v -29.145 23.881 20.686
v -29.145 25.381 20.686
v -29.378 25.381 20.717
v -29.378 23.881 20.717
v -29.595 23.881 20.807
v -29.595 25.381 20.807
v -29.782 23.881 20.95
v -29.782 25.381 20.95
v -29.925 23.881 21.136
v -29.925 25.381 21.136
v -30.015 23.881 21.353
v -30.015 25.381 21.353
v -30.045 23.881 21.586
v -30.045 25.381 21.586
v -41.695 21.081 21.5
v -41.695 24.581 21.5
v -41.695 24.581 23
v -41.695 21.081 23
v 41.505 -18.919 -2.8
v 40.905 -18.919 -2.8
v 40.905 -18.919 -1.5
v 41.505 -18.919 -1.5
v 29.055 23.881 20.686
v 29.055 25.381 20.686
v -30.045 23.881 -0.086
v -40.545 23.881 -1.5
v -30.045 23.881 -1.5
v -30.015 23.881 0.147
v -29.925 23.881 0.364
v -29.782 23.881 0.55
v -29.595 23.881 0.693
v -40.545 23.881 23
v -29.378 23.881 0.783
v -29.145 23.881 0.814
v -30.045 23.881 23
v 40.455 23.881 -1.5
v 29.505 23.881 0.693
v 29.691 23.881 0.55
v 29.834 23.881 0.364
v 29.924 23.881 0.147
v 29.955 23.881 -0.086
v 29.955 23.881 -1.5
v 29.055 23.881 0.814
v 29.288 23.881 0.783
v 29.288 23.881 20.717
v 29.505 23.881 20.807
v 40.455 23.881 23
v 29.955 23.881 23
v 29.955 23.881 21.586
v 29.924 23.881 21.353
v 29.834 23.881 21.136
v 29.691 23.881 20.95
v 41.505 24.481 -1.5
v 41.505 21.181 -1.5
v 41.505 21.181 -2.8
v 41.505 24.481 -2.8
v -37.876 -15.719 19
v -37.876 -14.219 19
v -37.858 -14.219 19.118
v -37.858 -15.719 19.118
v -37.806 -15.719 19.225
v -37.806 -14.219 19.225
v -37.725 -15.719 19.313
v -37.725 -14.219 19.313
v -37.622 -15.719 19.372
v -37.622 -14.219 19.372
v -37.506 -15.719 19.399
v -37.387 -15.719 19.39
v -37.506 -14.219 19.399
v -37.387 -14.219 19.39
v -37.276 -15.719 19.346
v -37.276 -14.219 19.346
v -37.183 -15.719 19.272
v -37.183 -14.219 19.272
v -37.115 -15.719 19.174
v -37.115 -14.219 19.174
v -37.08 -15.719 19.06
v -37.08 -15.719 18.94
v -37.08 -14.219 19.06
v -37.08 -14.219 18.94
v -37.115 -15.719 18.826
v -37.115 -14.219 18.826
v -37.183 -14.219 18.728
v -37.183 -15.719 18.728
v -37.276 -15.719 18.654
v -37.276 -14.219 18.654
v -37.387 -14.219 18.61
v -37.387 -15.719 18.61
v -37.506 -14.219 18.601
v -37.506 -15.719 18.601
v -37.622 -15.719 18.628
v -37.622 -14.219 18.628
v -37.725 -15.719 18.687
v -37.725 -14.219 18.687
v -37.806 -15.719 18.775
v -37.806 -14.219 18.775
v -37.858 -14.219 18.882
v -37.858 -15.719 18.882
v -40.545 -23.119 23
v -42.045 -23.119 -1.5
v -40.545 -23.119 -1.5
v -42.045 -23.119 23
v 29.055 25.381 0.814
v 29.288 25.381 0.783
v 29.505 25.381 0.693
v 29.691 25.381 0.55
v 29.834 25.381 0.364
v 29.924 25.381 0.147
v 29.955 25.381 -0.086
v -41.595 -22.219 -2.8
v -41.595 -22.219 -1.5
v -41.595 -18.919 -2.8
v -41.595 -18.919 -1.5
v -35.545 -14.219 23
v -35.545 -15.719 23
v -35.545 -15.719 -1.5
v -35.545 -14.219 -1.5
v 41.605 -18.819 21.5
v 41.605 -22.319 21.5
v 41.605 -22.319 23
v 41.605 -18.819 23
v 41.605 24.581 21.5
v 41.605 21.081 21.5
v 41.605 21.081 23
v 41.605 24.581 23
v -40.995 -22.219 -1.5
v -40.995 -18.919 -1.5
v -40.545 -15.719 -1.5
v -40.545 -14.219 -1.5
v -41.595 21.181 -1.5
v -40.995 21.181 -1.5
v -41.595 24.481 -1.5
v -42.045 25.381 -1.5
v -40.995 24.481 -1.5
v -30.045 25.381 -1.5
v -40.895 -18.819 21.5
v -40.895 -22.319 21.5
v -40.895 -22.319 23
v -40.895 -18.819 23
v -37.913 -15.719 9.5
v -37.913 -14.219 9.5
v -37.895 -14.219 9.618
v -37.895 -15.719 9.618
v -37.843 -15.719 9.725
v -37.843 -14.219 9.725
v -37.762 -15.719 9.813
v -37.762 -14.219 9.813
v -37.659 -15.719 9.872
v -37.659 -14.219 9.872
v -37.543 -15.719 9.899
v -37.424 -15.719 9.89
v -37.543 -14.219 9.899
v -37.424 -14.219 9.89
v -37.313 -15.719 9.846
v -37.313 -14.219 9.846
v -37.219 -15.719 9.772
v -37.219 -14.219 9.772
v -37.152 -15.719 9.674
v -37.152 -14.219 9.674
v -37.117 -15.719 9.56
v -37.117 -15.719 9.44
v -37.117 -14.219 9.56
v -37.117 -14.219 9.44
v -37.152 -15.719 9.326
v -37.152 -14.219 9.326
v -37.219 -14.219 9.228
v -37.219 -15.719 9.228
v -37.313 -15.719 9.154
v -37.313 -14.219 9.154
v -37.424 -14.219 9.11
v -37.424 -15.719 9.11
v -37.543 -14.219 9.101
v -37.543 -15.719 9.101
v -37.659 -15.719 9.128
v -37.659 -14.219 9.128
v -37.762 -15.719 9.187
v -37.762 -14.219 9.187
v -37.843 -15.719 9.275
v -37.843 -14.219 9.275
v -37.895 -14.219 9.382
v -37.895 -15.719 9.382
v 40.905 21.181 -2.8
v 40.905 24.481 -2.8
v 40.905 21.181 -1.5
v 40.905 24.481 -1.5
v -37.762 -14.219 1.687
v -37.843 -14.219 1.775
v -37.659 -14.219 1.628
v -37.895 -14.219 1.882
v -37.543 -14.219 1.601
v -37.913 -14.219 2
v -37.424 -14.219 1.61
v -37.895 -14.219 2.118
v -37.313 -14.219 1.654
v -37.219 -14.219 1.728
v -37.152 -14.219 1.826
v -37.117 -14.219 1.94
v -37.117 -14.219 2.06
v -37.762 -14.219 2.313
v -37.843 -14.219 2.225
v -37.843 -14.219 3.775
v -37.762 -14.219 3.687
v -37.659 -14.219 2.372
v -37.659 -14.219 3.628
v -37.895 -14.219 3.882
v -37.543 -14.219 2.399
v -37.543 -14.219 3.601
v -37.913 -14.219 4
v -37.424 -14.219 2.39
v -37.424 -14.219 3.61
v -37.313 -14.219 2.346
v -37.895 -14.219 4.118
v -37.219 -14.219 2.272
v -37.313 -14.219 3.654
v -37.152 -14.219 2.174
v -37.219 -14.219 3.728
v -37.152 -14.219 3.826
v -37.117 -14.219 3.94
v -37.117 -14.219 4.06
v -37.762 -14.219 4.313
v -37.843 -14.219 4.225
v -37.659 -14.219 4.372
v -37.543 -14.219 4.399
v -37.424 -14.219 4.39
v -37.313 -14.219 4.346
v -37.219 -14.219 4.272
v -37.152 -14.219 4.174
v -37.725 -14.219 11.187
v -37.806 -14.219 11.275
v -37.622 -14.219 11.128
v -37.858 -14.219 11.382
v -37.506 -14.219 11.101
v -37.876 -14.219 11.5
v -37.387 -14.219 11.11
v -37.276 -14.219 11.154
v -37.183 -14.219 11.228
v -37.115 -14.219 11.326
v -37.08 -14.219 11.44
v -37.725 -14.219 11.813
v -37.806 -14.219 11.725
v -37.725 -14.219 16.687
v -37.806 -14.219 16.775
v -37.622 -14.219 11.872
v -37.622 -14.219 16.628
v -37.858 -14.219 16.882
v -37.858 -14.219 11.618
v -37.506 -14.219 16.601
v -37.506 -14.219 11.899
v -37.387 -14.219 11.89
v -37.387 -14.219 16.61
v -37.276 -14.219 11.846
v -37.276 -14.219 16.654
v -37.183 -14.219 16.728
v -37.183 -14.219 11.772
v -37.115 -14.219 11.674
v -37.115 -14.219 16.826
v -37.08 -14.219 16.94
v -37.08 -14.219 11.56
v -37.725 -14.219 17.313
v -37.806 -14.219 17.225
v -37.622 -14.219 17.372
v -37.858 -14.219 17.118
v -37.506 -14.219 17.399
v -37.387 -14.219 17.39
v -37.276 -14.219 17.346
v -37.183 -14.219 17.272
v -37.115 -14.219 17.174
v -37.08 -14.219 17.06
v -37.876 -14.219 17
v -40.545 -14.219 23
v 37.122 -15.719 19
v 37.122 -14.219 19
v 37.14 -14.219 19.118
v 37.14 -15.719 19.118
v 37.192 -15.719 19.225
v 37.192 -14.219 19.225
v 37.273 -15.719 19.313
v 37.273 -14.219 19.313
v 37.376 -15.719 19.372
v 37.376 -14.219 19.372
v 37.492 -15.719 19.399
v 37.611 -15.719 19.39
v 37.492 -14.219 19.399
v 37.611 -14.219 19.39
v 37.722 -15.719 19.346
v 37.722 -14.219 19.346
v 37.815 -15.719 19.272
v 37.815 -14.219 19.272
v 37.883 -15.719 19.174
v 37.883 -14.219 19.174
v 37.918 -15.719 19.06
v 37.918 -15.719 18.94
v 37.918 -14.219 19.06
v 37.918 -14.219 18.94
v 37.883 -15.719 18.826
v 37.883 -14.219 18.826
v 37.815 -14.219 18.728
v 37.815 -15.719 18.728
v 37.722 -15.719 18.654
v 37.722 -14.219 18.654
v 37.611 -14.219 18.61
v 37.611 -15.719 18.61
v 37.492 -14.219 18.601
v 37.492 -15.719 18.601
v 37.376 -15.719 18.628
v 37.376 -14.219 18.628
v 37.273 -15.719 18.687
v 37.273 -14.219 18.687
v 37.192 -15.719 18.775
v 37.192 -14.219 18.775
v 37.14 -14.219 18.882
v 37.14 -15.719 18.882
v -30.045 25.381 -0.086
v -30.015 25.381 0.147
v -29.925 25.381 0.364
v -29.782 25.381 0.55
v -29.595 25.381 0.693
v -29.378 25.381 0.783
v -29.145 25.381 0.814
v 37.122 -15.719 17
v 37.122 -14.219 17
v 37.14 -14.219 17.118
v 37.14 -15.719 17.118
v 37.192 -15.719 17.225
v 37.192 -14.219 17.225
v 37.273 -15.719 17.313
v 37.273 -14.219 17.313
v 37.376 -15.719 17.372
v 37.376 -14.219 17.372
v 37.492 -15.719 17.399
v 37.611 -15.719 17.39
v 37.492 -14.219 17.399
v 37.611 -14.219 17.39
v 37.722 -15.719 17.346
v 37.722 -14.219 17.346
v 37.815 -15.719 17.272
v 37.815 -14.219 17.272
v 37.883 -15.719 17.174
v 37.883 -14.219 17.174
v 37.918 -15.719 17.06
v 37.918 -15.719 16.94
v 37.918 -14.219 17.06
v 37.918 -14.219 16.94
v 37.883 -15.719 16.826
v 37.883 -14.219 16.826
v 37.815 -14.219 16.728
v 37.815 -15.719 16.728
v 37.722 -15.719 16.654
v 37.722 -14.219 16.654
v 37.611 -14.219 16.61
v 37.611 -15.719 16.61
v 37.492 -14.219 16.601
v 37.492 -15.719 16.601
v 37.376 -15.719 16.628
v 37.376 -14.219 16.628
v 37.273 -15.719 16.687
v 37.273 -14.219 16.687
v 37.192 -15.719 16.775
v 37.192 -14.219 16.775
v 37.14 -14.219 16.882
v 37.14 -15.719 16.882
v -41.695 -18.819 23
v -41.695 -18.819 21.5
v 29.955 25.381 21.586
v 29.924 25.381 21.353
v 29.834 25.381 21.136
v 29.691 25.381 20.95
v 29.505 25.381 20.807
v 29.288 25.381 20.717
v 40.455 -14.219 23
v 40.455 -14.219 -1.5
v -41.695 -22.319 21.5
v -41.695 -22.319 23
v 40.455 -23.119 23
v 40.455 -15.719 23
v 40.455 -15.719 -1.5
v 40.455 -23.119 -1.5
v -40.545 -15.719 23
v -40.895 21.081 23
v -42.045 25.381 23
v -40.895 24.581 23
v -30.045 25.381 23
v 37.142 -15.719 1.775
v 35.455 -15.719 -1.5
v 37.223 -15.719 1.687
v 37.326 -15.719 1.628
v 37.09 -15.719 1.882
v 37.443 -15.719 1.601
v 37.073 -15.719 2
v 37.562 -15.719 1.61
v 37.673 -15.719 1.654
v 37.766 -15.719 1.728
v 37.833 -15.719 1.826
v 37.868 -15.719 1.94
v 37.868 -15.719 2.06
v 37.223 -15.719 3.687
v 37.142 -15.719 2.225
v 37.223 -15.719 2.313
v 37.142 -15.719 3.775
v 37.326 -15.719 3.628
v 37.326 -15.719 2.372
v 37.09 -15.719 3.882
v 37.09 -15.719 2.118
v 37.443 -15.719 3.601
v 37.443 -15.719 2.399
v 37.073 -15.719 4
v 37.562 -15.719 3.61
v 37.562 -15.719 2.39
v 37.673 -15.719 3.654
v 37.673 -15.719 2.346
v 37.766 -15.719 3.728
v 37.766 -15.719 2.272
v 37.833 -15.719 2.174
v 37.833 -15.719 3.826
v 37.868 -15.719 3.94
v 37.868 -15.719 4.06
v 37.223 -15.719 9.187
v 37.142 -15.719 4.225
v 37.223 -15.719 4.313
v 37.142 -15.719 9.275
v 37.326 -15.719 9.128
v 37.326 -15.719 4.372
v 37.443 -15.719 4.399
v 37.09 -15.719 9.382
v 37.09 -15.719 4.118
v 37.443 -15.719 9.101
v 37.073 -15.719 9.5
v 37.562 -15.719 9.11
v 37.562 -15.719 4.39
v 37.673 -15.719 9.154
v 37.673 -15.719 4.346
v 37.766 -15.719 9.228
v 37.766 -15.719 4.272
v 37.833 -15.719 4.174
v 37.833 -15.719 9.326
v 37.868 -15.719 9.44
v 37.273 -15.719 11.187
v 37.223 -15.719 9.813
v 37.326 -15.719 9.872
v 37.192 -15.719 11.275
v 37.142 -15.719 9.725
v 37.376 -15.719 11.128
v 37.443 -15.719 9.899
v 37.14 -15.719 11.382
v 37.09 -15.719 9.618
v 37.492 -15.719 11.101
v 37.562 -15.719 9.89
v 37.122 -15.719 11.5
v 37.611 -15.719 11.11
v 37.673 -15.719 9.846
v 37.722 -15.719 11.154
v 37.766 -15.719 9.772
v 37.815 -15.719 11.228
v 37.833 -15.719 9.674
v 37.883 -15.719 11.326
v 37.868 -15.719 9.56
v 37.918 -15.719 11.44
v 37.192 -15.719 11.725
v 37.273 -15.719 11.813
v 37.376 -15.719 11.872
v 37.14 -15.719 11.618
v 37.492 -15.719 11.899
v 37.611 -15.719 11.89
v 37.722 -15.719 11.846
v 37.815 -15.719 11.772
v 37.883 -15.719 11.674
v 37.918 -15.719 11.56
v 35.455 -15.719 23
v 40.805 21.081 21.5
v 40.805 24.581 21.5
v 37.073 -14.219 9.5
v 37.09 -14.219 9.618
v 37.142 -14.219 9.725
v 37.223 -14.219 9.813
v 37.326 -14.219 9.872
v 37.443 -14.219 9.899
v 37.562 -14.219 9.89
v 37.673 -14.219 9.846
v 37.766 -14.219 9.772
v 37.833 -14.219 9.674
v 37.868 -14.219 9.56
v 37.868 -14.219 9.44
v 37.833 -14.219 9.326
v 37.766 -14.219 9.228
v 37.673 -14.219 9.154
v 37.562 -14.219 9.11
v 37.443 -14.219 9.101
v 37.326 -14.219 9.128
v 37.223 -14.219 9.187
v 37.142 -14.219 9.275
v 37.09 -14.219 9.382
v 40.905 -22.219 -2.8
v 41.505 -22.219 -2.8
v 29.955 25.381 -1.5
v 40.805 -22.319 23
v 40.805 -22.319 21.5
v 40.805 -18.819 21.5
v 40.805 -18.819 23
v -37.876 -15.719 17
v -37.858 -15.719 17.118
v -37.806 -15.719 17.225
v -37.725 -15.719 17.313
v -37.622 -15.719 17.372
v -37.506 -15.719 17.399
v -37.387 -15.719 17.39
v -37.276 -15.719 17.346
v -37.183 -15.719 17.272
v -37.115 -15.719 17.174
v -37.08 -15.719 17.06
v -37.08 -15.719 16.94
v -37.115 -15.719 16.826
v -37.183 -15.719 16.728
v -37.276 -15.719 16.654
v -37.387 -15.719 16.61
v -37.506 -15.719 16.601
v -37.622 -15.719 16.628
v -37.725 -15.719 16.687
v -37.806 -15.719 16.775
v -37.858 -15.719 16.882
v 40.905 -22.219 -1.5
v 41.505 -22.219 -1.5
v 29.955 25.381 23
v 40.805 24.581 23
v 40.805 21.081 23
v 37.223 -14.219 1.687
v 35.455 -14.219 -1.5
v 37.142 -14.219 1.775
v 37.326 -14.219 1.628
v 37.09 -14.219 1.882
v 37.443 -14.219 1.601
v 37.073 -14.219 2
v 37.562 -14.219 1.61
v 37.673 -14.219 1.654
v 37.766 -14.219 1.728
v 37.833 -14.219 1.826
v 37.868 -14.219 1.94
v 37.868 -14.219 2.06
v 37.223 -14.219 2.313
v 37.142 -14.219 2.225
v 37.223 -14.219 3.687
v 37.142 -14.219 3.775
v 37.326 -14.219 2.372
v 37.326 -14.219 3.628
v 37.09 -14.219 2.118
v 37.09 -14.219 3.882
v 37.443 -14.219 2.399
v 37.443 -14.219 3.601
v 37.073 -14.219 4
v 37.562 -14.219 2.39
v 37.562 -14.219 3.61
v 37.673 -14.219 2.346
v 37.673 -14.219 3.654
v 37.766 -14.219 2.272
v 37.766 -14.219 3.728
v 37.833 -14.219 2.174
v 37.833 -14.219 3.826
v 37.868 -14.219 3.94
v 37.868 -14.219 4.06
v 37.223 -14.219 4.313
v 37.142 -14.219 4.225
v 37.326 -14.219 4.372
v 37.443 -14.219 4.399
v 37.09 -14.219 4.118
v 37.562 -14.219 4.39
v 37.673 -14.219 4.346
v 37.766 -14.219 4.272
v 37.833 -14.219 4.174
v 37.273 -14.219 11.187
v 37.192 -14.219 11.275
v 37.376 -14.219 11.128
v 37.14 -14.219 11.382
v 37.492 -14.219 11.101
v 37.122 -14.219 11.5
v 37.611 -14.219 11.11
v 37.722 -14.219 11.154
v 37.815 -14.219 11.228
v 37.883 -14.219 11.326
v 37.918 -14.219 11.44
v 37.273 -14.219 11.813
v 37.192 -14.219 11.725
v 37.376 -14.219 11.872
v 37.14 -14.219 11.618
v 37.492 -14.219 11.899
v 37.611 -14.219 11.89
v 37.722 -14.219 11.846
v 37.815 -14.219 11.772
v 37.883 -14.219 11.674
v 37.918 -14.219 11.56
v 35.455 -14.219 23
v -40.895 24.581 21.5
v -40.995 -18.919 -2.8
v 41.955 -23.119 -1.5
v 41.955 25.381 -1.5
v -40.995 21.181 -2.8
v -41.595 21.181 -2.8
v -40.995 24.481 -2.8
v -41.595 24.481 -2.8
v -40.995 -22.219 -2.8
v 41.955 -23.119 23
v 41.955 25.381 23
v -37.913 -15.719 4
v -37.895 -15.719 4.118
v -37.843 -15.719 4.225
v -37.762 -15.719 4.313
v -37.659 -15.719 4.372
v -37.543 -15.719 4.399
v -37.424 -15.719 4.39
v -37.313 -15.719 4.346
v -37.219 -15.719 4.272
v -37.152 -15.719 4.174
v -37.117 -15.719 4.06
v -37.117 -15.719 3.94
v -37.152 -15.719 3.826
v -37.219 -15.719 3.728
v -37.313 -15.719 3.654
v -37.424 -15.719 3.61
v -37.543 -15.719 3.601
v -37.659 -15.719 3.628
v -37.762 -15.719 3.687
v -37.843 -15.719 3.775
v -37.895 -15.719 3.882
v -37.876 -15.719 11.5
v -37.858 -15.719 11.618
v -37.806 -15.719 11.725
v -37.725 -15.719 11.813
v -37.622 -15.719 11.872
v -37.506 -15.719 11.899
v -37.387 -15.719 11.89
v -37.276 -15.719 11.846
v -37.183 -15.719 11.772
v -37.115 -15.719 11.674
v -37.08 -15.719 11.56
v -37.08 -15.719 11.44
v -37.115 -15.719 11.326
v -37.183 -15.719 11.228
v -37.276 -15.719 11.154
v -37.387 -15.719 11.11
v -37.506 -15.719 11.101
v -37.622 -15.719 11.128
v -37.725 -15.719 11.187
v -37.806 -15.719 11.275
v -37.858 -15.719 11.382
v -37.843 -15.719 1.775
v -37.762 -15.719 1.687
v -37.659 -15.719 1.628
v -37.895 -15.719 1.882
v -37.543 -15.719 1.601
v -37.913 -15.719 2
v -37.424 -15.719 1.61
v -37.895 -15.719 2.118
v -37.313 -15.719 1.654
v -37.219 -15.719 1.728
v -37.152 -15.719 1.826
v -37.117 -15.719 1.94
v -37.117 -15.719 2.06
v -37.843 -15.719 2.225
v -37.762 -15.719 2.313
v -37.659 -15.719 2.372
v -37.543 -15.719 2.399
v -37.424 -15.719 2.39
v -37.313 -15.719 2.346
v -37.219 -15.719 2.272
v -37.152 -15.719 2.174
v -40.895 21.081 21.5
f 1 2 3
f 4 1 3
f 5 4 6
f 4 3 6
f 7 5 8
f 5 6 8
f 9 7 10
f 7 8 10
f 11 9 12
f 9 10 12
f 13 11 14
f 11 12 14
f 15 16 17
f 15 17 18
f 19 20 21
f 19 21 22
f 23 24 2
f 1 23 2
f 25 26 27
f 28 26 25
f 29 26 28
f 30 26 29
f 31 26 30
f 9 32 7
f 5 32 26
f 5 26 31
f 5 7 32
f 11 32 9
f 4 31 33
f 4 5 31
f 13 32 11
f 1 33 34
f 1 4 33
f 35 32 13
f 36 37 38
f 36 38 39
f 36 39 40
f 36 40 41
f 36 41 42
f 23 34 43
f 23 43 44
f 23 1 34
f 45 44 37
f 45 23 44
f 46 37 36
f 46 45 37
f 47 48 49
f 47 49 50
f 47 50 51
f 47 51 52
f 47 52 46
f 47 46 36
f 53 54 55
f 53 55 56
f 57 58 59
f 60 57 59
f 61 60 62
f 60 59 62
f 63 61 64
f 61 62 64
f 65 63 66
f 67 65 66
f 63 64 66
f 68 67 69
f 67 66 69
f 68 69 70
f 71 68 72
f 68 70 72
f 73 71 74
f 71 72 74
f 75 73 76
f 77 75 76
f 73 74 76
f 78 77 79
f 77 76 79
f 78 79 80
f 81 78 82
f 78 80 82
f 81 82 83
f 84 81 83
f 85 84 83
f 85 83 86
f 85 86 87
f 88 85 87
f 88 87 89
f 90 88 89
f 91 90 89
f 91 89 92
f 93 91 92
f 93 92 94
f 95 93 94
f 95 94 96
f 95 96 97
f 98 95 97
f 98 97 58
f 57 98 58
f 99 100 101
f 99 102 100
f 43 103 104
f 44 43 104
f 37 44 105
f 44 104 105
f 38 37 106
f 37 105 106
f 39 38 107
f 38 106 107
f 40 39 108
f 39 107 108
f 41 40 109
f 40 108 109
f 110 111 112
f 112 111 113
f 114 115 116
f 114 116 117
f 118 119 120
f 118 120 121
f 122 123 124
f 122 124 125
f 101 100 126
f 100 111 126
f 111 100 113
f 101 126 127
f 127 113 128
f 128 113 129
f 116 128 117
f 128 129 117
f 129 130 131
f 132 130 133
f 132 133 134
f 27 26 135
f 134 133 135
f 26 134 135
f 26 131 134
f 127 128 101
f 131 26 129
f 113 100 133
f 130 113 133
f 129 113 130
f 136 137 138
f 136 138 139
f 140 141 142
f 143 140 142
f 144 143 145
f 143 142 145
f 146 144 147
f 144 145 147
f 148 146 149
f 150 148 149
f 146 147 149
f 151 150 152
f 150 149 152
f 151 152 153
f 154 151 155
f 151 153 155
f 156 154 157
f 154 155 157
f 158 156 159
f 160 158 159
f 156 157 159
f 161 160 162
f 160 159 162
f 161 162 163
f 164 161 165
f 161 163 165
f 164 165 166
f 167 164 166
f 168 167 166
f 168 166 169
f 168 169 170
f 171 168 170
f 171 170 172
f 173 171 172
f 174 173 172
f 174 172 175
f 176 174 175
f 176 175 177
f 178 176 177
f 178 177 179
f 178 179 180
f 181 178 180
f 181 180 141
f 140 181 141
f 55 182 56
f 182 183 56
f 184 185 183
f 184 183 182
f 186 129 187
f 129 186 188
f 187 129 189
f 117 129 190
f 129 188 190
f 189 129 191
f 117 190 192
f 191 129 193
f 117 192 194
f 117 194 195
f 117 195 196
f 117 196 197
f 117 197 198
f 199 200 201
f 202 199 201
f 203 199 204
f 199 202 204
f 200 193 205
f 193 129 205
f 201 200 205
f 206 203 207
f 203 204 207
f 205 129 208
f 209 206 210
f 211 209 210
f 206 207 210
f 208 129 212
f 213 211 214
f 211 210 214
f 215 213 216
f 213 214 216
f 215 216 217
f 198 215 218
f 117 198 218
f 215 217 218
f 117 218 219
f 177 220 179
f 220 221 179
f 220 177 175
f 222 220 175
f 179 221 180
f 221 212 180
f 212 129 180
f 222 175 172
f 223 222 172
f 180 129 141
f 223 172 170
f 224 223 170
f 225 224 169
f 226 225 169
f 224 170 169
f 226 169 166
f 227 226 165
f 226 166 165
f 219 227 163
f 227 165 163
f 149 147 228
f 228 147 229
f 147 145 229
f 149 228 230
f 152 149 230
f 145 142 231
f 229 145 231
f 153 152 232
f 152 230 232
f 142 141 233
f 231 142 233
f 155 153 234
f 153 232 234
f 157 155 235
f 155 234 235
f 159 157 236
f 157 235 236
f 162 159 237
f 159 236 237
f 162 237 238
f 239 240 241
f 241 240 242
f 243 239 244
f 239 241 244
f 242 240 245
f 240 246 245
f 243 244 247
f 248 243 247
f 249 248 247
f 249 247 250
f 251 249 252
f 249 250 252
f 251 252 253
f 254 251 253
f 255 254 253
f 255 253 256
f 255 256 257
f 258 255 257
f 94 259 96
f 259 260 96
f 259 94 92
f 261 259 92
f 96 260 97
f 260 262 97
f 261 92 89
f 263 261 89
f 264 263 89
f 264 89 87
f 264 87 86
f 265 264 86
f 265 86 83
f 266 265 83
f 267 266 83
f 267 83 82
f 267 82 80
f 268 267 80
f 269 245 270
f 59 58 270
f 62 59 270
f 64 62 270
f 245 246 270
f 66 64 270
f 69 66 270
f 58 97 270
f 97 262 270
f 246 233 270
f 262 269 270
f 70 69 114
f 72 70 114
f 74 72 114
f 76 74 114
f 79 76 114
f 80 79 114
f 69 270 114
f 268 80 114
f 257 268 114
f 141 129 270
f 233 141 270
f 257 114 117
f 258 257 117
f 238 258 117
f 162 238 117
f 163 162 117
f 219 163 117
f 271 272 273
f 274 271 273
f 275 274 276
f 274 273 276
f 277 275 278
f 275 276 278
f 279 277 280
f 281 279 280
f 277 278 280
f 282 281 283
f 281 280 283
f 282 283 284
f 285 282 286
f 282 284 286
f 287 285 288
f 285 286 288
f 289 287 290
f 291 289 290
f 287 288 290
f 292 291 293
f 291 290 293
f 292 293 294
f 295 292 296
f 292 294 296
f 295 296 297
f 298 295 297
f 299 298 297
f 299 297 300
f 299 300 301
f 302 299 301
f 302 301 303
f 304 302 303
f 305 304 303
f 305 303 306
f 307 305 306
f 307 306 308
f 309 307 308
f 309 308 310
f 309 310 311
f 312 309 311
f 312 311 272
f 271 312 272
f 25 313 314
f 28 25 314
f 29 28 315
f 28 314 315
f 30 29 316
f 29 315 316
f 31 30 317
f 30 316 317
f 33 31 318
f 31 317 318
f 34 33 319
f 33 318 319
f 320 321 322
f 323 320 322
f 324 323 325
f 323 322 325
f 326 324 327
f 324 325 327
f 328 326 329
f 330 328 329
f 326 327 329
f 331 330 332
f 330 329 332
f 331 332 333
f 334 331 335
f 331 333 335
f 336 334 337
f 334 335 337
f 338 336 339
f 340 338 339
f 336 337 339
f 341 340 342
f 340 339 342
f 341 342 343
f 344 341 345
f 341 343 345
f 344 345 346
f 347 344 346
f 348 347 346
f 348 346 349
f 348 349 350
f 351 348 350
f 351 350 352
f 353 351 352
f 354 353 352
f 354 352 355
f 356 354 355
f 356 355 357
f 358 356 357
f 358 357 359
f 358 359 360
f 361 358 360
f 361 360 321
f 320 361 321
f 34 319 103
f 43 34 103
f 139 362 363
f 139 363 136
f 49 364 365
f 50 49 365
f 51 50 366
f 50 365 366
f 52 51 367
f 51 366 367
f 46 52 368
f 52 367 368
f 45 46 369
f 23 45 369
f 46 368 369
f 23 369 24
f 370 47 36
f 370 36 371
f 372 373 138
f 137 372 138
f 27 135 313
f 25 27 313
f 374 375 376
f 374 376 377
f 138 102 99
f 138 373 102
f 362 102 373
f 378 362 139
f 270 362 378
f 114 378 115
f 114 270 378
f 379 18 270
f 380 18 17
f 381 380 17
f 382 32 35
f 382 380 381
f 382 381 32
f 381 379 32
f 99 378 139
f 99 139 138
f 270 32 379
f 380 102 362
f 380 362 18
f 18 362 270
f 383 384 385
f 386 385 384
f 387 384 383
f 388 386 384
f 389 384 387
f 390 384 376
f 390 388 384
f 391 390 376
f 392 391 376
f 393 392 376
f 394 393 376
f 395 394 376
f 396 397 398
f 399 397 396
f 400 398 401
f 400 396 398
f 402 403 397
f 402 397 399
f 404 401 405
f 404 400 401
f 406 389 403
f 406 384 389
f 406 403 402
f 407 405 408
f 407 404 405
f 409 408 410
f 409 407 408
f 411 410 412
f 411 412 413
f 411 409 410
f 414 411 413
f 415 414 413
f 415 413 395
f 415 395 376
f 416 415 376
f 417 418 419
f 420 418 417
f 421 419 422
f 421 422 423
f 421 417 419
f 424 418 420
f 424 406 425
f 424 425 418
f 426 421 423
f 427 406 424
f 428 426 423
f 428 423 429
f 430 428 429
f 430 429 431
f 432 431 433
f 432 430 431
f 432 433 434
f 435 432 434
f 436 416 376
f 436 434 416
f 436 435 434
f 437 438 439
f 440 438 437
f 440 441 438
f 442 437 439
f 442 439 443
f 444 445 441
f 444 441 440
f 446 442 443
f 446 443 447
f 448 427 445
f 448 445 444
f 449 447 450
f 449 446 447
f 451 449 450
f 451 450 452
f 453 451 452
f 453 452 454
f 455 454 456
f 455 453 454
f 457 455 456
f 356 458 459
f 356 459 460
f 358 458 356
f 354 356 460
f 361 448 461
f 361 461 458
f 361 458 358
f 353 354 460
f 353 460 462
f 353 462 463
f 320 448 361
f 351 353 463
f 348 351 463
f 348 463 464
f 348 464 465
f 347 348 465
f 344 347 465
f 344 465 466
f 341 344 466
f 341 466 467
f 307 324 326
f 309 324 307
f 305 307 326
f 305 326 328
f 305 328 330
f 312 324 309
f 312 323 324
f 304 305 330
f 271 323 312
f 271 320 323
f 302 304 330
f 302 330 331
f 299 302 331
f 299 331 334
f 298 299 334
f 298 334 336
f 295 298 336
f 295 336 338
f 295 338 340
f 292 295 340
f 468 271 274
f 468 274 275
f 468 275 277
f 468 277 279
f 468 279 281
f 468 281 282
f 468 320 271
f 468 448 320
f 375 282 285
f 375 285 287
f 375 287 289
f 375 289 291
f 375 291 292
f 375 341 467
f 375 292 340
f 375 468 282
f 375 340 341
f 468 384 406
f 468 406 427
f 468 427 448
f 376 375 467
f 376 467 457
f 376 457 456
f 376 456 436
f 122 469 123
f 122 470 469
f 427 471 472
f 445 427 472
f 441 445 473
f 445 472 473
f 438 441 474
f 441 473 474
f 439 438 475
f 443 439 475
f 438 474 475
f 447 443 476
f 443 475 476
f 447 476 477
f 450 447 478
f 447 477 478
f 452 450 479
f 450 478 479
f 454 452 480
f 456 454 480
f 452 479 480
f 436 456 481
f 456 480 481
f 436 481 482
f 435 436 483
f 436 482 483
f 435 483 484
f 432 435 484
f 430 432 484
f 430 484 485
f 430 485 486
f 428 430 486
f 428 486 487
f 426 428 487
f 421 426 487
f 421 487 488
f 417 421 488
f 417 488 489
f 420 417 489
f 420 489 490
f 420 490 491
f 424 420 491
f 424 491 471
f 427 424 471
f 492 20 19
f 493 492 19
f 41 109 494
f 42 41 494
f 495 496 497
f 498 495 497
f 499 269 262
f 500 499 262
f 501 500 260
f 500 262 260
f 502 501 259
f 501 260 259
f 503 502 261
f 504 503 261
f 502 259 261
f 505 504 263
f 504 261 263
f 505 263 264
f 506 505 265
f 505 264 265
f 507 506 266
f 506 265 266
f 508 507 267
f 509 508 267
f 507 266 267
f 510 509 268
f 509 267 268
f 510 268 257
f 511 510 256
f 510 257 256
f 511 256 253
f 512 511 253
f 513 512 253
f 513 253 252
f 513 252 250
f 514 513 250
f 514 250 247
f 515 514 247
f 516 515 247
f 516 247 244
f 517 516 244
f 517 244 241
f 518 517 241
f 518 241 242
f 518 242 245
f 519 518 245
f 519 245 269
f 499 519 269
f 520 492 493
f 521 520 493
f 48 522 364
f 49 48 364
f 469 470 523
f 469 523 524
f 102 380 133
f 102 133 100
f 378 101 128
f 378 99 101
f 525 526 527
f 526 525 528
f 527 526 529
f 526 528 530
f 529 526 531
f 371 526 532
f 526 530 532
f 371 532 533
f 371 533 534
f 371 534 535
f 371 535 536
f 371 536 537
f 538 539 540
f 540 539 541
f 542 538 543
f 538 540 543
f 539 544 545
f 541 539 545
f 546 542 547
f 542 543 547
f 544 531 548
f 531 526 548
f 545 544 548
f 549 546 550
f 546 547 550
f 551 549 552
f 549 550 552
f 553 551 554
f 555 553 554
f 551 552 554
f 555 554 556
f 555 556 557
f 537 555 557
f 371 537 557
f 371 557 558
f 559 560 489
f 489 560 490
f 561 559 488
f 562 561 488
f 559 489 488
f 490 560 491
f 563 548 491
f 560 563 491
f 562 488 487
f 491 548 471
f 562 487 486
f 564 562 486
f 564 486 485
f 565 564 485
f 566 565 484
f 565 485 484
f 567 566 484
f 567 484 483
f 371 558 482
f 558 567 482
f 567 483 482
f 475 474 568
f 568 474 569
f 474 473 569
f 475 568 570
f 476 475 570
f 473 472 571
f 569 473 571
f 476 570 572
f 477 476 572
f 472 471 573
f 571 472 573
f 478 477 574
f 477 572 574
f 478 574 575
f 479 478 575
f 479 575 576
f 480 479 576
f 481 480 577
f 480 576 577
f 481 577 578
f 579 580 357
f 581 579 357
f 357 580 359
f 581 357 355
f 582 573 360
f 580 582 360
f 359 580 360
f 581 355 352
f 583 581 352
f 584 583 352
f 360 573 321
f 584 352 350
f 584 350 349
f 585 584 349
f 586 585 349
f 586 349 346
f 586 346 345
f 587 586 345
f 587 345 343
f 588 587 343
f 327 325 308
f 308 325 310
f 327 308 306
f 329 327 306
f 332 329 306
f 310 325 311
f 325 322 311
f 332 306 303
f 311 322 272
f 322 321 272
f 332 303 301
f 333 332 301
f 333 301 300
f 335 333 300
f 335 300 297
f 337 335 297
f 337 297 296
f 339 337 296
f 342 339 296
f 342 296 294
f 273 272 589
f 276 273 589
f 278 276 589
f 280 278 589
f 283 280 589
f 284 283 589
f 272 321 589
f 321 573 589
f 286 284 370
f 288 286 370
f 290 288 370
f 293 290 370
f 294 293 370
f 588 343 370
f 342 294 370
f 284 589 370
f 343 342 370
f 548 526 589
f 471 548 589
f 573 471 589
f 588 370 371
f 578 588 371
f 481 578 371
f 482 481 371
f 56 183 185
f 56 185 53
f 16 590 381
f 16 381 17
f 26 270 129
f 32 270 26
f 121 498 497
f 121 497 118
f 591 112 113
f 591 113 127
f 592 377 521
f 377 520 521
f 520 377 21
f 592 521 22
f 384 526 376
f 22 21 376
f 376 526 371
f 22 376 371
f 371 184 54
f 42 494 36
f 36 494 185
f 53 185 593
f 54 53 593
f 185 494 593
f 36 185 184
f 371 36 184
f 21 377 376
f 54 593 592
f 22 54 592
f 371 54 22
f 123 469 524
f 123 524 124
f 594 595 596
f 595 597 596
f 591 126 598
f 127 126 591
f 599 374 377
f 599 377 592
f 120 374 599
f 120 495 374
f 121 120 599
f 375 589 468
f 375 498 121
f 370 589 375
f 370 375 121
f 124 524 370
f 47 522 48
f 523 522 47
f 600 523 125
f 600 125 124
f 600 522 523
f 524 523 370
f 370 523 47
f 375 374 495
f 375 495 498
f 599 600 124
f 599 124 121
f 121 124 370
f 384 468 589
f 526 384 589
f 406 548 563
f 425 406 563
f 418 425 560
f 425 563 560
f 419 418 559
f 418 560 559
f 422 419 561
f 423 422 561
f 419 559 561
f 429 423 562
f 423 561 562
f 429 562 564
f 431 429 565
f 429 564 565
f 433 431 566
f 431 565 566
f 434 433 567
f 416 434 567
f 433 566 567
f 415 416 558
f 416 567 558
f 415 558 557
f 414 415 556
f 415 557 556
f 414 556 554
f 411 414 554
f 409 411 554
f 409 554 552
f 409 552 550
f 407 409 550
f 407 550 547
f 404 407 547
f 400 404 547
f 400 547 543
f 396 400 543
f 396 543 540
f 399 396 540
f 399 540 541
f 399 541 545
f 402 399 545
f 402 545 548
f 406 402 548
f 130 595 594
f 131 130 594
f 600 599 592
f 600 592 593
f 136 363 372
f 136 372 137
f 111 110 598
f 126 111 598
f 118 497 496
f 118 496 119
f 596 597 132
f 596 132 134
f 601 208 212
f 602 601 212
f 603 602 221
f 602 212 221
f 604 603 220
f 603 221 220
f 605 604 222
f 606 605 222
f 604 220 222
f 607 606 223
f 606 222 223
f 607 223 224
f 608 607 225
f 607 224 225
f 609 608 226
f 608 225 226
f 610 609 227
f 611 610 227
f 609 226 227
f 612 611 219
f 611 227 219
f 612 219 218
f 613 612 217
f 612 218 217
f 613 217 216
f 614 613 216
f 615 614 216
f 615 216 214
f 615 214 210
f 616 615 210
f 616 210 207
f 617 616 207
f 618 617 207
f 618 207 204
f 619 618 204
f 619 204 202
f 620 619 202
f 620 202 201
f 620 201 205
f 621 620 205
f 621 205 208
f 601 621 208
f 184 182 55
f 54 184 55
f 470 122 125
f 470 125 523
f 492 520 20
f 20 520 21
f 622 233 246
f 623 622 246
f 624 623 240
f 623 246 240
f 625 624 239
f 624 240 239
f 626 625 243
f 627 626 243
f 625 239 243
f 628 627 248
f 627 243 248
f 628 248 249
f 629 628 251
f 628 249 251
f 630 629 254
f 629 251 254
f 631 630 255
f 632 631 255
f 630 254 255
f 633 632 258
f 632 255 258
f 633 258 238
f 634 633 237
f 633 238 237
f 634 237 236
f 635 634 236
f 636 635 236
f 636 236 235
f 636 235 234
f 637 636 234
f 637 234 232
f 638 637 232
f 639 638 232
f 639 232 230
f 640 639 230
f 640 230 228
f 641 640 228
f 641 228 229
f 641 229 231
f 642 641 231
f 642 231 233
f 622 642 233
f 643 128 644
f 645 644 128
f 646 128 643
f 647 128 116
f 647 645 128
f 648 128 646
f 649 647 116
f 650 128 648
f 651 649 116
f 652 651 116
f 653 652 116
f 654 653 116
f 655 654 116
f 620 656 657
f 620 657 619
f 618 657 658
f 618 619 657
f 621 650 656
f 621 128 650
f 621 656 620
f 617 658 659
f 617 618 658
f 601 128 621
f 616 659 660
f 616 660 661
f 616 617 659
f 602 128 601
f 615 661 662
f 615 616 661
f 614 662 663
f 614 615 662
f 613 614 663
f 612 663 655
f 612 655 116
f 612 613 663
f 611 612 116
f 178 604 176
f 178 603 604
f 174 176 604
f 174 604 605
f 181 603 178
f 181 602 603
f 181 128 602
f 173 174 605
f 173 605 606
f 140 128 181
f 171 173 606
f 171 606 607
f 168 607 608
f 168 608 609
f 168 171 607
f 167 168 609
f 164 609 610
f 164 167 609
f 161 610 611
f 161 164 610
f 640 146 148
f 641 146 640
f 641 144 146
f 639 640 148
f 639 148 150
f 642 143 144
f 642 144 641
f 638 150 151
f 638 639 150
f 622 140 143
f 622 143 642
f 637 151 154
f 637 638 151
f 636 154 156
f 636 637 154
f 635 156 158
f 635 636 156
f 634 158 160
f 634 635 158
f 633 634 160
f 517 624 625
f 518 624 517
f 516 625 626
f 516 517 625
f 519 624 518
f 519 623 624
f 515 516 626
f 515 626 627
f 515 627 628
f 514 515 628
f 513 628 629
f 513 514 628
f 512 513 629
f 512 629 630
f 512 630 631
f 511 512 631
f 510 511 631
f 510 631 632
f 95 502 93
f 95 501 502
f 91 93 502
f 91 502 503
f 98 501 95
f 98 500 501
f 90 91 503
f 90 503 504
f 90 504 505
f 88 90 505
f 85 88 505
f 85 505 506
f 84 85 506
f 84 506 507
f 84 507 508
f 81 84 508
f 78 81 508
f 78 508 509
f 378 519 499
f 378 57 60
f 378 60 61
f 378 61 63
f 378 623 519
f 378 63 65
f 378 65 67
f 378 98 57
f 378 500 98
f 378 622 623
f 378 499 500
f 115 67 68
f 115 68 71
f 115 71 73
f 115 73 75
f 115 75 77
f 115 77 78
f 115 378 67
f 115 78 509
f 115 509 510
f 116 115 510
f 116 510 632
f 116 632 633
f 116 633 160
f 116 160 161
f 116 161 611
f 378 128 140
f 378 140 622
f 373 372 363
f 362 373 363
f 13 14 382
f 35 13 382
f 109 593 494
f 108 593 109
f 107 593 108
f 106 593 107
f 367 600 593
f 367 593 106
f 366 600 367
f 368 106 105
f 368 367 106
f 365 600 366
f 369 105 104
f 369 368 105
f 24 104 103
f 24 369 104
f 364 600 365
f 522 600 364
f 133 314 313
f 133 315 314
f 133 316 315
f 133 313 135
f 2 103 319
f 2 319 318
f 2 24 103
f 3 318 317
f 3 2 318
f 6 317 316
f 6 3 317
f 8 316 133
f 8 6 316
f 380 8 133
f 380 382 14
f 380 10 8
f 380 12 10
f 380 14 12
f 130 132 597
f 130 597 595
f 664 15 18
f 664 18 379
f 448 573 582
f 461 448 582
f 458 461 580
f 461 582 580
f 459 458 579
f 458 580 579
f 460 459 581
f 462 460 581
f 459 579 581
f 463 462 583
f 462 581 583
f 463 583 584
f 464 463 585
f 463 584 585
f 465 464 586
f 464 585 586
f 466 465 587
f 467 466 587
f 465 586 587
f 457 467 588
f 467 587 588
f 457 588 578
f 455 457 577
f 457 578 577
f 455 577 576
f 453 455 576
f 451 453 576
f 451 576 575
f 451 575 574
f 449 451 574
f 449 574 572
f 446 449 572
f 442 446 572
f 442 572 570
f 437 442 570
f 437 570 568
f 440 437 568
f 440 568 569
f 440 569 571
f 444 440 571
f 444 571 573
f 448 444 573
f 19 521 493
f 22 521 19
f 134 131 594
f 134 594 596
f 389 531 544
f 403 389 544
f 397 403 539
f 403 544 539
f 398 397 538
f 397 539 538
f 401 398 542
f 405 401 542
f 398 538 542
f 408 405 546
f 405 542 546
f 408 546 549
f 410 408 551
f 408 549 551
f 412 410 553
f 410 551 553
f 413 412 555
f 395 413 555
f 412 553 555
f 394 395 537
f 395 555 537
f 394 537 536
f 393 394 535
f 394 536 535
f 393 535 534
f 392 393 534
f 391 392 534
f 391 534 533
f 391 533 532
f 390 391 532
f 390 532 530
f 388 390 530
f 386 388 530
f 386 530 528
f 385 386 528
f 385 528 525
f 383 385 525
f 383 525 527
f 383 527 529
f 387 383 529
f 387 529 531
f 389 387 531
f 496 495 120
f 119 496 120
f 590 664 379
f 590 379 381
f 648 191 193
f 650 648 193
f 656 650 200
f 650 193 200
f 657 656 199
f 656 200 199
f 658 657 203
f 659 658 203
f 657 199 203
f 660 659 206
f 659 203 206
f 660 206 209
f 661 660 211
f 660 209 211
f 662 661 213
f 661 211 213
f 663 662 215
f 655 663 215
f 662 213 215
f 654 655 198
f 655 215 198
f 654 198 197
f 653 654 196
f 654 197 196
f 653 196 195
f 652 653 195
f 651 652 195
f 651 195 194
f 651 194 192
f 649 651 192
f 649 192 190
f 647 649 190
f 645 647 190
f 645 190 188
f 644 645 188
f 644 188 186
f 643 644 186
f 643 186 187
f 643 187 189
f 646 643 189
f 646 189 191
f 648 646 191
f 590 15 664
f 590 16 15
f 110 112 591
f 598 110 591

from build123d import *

# Parameters (mm, degrees)
F0_W          = 5
F0_H          = 1.5
F0_W_2        = 0.8
F0_H_2        = 3.5
F0_W_3        = 0.6
F0_H_3        = 3.3
F0_H_4        = 2.7
F0_H_5        = 0.6
F1_DEPTH      = 23
F1_DEPTH_BACK = 1.5
F3_D          = 0.8
F3_DEPTH      = 2
F3_TIP        = 0.2403442476
F5_D          = 0.8
F5_DEPTH      = 2
F5_TIP        = 0.2403442476
F6_DEPTH      = 2.8
F7_START      = 21.5
F7_DEPTH      = 1.5
F9_DEPTH      = 2


# Not quite as in the source:
# - a feature names something its author has since deleted; it is built from what else it names


with BuildPart() as f1:
    # F0 (on Top) → F1 (new body, two sides)
    with BuildSketch(Plane.XY) as f1_sk:
        with Locations((-38.0453250408, -14.9690947816)):
            Rectangle(F0_W, F0_H)
        Polygon((-42.0453250408, -23.1190947816), (-40.5453250408, -23.1190947816), (-40.5453250408, -15.7190947816), (-40.5453250408, -14.2190947816), (-40.5453250408, 23.8809052184), (-40.8953250408, 23.8809052184), (-40.8953250408, 21.0809052184), (-41.6953250408, 21.0809052184), (-41.6953250408, 23.8809052184), (-42.0453250408, 23.8809052184), align=None)
        with Locations((-41.2953250408, -20.5690947816)):
            Rectangle(F0_W_2, F0_H_2, mode=Mode.SUBTRACT)
        Polygon((-42.0453250408, 25.3809052184), (-42.0453250408, 23.8809052184), (-41.6953250408, 23.8809052184), (-41.6953250408, 24.5809052184), (-40.8953250408, 24.5809052184), (-40.8953250408, 23.8809052184), (-40.5453250408, 23.8809052184), (40.4546749592, 23.8809052184), (40.8046749592, 23.8809052184), (40.8046749592, 24.5809052184), (41.6046749592, 24.5809052184), (41.6046749592, 23.8809052184), (41.9546749592, 23.8809052184), (41.9546749592, 25.3809052184), align=None)
        Polygon((40.8046749592, 23.8809052184), (40.4546749592, 23.8809052184), (40.4546749592, -14.2186603174), (40.4546749592, -15.7186603174), (40.4546749592, -23.1190947816), (41.9546749592, -23.1190947816), (41.9546749592, 23.8809052184), (41.6046749592, 23.8809052184), (41.6046749592, 21.0809052184), (40.8046749592, 21.0809052184), align=None)
        with Locations((41.2046749592, -20.5690947816)):
            Rectangle(F0_W_2, F0_H_2, mode=Mode.SUBTRACT)
        with Locations((37.9546749592, -14.9686603174)):
            Rectangle(F0_W, F0_H)
        with Locations((-41.2953250408, -20.5690947816)):
            Rectangle(F0_W_2, F0_H_2)
        with Locations((-41.2953250408, -20.5690947816)):
            Rectangle(F0_W_3, F0_H_3, mode=Mode.SUBTRACT)
        with Locations((41.2046749592, -20.5690947816)):
            Rectangle(F0_W_2, F0_H_2)
        with Locations((41.2046749592, -20.5690947816)):
            Rectangle(F0_W_3, F0_H_3, mode=Mode.SUBTRACT)
        Polygon((40.9046749592, 23.8809052184), (40.8046749592, 23.8809052184), (40.8046749592, 21.0809052184), (41.6046749592, 21.0809052184), (41.6046749592, 23.8809052184), (41.5046749592, 23.8809052184), (41.5046749592, 21.1809052184), (40.9046749592, 21.1809052184), align=None)
        Polygon((40.8046749592, 24.5809052184), (40.8046749592, 23.8809052184), (40.9046749592, 23.8809052184), (40.9046749592, 24.4809052184), (41.5046749592, 24.4809052184), (41.5046749592, 23.8809052184), (41.6046749592, 23.8809052184), (41.6046749592, 24.5809052184), align=None)
        Polygon((-41.6953250408, 24.5809052184), (-41.6953250408, 23.8809052184), (-41.5953250408, 23.8809052184), (-41.5953250408, 24.4809052184), (-40.9953250408, 24.4809052184), (-40.9953250408, 23.8809052184), (-40.8953250408, 23.8809052184), (-40.8953250408, 24.5809052184), align=None)
        Polygon((-41.5953250408, 23.8809052184), (-41.6953250408, 23.8809052184), (-41.6953250408, 21.0809052184), (-40.8953250408, 21.0809052184), (-40.8953250408, 23.8809052184), (-40.9953250408, 23.8809052184), (-40.9953250408, 21.1809052184), (-41.5953250408, 21.1809052184), align=None)
        with Locations((-41.2953250408, -20.5690947816)):
            Rectangle(F0_W_3, F0_H_3)
        with Locations((-41.2953250408, 22.5309052184)):
            Rectangle(F0_W_3, F0_H_4)
        with Locations((41.2046749592, -20.5690947816)):
            Rectangle(F0_W_3, F0_H_3)
        with Locations((41.2046749592, 22.5309052184)):
            Rectangle(F0_W_3, F0_H_4)
        with Locations((41.2046749592, 24.1809052184)):
            Rectangle(F0_W_3, F0_H_5)
        with Locations((-41.2953250408, 24.1809052184)):
            Rectangle(F0_W_3, F0_H_5)
    extrude(amount=F1_DEPTH)
    extrude(f1_sk.sketch, amount=-F1_DEPTH_BACK)

    # F3
    with Locations(Plane.XZ.offset(15.7190947816)):
        with Locations((-37.4758429825, 18.9999998622), (-37.4758429825, 16.9999998622), (-37.4758429825, 11.4999998622), (-37.5126936273, 9.5), (-37.5126936273, 3.9999998622), (-37.5126936273, 2)):
            Hole(F3_D / 2, depth=F3_DEPTH)
            with Locations((0, 0, -(F3_DEPTH + F3_TIP / 2))):  # 118° drill point
                Cone(0, F3_D / 2, F3_TIP, mode=Mode.SUBTRACT)

    # F5
    with Locations(Plane.XZ.offset(15.7186603174)):
        with Locations((37.5221328411, 19.00000019), (37.5221328411, 17.00000019), (37.5221328411, 11.50000019), (37.4725908041, 9.5000003278), (37.4725908041, 4.00000019), (37.4725908041, 2.0000003278)):
            Hole(F5_D / 2, depth=F5_DEPTH)
            with Locations((0, 0, -(F5_DEPTH + F5_TIP / 2))):  # 118° drill point
                Cone(0, F5_D / 2, F5_TIP, mode=Mode.SUBTRACT)

    # F0 (on Top) → F6 (join)
    with BuildSketch(Plane.XY):
        with Locations((-41.2953250408, 22.5309052184)):
            Rectangle(F0_W_3, F0_H_4)
        with Locations((-41.2953250408, 24.1809052184)):
            Rectangle(F0_W_3, F0_H_5)
        with Locations((-41.2953250408, -20.5690947816)):
            Rectangle(F0_W_3, F0_H_3)
        with Locations((41.2046749592, 22.5309052184)):
            Rectangle(F0_W_3, F0_H_4)
        with Locations((41.2046749592, 24.1809052184)):
            Rectangle(F0_W_3, F0_H_5)
        with Locations((41.2046749592, -20.5690947816)):
            Rectangle(F0_W_3, F0_H_3)
    extrude(amount=-F6_DEPTH)

    # F0 (on Top) → F7 (cut)
    with BuildSketch(Plane.XY.offset(F7_START)):
        with Locations((-41.2953250408, -20.5690947816)):
            Rectangle(F0_W_2, F0_H_2)
        with Locations((-41.2953250408, -20.5690947816)):
            Rectangle(F0_W_3, F0_H_3, mode=Mode.SUBTRACT)
        with Locations((41.2046749592, -20.5690947816)):
            Rectangle(F0_W_2, F0_H_2)
        with Locations((41.2046749592, -20.5690947816)):
            Rectangle(F0_W_3, F0_H_3, mode=Mode.SUBTRACT)
        with Locations((-41.2953250408, -20.5690947816)):
            Rectangle(F0_W_3, F0_H_3)
        with Locations((41.2046749592, -20.5690947816)):
            Rectangle(F0_W_3, F0_H_3)
        with Locations((-41.2953250408, 22.5309052184)):
            Rectangle(F0_W_3, F0_H_4)
        with Locations((41.2046749592, 22.5309052184)):
            Rectangle(F0_W_3, F0_H_4)
        Polygon((-41.5953250408, 23.8809052184), (-41.6953250408, 23.8809052184), (-41.6953250408, 21.0809052184), (-40.8953250408, 21.0809052184), (-40.8953250408, 23.8809052184), (-40.9953250408, 23.8809052184), (-40.9953250408, 21.1809052184), (-41.5953250408, 21.1809052184), align=None)
        Polygon((40.9046749592, 23.8809052184), (40.8046749592, 23.8809052184), (40.8046749592, 21.0809052184), (41.6046749592, 21.0809052184), (41.6046749592, 23.8809052184), (41.5046749592, 23.8809052184), (41.5046749592, 21.1809052184), (40.9046749592, 21.1809052184), align=None)
        with Locations((-41.2953250408, 24.1809052184)):
            Rectangle(F0_W_3, F0_H_5)
        with Locations((41.2046749592, 24.1809052184)):
            Rectangle(F0_W_3, F0_H_5)
        Polygon((40.8046749592, 24.5809052184), (40.8046749592, 23.8809052184), (40.9046749592, 23.8809052184), (40.9046749592, 24.4809052184), (41.5046749592, 24.4809052184), (41.5046749592, 23.8809052184), (41.6046749592, 23.8809052184), (41.6046749592, 24.5809052184), align=None)
        Polygon((-41.6953250408, 24.5809052184), (-41.6953250408, 23.8809052184), (-41.5953250408, 23.8809052184), (-41.5953250408, 24.4809052184), (-40.9953250408, 24.4809052184), (-40.9953250408, 23.8809052184), (-40.8953250408, 23.8809052184), (-40.8953250408, 24.5809052184), align=None)
    extrude(amount=F7_DEPTH, mode=Mode.SUBTRACT)

    # F8 (on face) → F9 (cut)
    with BuildSketch(Plane(origin=(0, 25.3809052184, 0), x_dir=(-1, 0, 0), z_dir=(0, 1, 0))):
        with BuildLine():
            ThreePointArc((-29.9546749592, 21.5864117908), (-29.6910710623, 20.9500156878), (-29.0546749592, 20.6864117908))
            Line((-29.0546749592, 20.6864117908), (29.1453250408, 20.6864117908))
            ThreePointArc((29.1453250408, 20.6864117908), (29.7817211439, 20.9500156878), (30.0453250408, 21.5864117908))
            Line((30.0453250408, 21.5864117908), (30.0453250408, 23))
            Line((30.0453250408, 23), (-29.9546749592, 23))
            Line((-29.9546749592, 23), (-29.9546749592, 21.5864117908))
        make_face()
        with BuildLine():
            Line((-29.9546749592, -0.0864118039), (-29.9546749592, -1.500000013))
            Line((-29.9546749592, -1.500000013), (30.0453250408, -1.500000013))
            Line((30.0453250408, -1.500000013), (30.0453250408, -0.0864118039))
            ThreePointArc((30.0453250408, -0.0864118039), (29.7817211439, 0.5499842992), (29.1453250408, 0.8135881961))
            Line((29.1453250408, 0.8135881961), (-29.0546749592, 0.8135881961))
            ThreePointArc((-29.0546749592, 0.8135881961), (-29.6910710623, 0.5499842992), (-29.9546749592, -0.0864118039))
        make_face()
    extrude(amount=-F9_DEPTH, mode=Mode.SUBTRACT)


solid = f1.part
